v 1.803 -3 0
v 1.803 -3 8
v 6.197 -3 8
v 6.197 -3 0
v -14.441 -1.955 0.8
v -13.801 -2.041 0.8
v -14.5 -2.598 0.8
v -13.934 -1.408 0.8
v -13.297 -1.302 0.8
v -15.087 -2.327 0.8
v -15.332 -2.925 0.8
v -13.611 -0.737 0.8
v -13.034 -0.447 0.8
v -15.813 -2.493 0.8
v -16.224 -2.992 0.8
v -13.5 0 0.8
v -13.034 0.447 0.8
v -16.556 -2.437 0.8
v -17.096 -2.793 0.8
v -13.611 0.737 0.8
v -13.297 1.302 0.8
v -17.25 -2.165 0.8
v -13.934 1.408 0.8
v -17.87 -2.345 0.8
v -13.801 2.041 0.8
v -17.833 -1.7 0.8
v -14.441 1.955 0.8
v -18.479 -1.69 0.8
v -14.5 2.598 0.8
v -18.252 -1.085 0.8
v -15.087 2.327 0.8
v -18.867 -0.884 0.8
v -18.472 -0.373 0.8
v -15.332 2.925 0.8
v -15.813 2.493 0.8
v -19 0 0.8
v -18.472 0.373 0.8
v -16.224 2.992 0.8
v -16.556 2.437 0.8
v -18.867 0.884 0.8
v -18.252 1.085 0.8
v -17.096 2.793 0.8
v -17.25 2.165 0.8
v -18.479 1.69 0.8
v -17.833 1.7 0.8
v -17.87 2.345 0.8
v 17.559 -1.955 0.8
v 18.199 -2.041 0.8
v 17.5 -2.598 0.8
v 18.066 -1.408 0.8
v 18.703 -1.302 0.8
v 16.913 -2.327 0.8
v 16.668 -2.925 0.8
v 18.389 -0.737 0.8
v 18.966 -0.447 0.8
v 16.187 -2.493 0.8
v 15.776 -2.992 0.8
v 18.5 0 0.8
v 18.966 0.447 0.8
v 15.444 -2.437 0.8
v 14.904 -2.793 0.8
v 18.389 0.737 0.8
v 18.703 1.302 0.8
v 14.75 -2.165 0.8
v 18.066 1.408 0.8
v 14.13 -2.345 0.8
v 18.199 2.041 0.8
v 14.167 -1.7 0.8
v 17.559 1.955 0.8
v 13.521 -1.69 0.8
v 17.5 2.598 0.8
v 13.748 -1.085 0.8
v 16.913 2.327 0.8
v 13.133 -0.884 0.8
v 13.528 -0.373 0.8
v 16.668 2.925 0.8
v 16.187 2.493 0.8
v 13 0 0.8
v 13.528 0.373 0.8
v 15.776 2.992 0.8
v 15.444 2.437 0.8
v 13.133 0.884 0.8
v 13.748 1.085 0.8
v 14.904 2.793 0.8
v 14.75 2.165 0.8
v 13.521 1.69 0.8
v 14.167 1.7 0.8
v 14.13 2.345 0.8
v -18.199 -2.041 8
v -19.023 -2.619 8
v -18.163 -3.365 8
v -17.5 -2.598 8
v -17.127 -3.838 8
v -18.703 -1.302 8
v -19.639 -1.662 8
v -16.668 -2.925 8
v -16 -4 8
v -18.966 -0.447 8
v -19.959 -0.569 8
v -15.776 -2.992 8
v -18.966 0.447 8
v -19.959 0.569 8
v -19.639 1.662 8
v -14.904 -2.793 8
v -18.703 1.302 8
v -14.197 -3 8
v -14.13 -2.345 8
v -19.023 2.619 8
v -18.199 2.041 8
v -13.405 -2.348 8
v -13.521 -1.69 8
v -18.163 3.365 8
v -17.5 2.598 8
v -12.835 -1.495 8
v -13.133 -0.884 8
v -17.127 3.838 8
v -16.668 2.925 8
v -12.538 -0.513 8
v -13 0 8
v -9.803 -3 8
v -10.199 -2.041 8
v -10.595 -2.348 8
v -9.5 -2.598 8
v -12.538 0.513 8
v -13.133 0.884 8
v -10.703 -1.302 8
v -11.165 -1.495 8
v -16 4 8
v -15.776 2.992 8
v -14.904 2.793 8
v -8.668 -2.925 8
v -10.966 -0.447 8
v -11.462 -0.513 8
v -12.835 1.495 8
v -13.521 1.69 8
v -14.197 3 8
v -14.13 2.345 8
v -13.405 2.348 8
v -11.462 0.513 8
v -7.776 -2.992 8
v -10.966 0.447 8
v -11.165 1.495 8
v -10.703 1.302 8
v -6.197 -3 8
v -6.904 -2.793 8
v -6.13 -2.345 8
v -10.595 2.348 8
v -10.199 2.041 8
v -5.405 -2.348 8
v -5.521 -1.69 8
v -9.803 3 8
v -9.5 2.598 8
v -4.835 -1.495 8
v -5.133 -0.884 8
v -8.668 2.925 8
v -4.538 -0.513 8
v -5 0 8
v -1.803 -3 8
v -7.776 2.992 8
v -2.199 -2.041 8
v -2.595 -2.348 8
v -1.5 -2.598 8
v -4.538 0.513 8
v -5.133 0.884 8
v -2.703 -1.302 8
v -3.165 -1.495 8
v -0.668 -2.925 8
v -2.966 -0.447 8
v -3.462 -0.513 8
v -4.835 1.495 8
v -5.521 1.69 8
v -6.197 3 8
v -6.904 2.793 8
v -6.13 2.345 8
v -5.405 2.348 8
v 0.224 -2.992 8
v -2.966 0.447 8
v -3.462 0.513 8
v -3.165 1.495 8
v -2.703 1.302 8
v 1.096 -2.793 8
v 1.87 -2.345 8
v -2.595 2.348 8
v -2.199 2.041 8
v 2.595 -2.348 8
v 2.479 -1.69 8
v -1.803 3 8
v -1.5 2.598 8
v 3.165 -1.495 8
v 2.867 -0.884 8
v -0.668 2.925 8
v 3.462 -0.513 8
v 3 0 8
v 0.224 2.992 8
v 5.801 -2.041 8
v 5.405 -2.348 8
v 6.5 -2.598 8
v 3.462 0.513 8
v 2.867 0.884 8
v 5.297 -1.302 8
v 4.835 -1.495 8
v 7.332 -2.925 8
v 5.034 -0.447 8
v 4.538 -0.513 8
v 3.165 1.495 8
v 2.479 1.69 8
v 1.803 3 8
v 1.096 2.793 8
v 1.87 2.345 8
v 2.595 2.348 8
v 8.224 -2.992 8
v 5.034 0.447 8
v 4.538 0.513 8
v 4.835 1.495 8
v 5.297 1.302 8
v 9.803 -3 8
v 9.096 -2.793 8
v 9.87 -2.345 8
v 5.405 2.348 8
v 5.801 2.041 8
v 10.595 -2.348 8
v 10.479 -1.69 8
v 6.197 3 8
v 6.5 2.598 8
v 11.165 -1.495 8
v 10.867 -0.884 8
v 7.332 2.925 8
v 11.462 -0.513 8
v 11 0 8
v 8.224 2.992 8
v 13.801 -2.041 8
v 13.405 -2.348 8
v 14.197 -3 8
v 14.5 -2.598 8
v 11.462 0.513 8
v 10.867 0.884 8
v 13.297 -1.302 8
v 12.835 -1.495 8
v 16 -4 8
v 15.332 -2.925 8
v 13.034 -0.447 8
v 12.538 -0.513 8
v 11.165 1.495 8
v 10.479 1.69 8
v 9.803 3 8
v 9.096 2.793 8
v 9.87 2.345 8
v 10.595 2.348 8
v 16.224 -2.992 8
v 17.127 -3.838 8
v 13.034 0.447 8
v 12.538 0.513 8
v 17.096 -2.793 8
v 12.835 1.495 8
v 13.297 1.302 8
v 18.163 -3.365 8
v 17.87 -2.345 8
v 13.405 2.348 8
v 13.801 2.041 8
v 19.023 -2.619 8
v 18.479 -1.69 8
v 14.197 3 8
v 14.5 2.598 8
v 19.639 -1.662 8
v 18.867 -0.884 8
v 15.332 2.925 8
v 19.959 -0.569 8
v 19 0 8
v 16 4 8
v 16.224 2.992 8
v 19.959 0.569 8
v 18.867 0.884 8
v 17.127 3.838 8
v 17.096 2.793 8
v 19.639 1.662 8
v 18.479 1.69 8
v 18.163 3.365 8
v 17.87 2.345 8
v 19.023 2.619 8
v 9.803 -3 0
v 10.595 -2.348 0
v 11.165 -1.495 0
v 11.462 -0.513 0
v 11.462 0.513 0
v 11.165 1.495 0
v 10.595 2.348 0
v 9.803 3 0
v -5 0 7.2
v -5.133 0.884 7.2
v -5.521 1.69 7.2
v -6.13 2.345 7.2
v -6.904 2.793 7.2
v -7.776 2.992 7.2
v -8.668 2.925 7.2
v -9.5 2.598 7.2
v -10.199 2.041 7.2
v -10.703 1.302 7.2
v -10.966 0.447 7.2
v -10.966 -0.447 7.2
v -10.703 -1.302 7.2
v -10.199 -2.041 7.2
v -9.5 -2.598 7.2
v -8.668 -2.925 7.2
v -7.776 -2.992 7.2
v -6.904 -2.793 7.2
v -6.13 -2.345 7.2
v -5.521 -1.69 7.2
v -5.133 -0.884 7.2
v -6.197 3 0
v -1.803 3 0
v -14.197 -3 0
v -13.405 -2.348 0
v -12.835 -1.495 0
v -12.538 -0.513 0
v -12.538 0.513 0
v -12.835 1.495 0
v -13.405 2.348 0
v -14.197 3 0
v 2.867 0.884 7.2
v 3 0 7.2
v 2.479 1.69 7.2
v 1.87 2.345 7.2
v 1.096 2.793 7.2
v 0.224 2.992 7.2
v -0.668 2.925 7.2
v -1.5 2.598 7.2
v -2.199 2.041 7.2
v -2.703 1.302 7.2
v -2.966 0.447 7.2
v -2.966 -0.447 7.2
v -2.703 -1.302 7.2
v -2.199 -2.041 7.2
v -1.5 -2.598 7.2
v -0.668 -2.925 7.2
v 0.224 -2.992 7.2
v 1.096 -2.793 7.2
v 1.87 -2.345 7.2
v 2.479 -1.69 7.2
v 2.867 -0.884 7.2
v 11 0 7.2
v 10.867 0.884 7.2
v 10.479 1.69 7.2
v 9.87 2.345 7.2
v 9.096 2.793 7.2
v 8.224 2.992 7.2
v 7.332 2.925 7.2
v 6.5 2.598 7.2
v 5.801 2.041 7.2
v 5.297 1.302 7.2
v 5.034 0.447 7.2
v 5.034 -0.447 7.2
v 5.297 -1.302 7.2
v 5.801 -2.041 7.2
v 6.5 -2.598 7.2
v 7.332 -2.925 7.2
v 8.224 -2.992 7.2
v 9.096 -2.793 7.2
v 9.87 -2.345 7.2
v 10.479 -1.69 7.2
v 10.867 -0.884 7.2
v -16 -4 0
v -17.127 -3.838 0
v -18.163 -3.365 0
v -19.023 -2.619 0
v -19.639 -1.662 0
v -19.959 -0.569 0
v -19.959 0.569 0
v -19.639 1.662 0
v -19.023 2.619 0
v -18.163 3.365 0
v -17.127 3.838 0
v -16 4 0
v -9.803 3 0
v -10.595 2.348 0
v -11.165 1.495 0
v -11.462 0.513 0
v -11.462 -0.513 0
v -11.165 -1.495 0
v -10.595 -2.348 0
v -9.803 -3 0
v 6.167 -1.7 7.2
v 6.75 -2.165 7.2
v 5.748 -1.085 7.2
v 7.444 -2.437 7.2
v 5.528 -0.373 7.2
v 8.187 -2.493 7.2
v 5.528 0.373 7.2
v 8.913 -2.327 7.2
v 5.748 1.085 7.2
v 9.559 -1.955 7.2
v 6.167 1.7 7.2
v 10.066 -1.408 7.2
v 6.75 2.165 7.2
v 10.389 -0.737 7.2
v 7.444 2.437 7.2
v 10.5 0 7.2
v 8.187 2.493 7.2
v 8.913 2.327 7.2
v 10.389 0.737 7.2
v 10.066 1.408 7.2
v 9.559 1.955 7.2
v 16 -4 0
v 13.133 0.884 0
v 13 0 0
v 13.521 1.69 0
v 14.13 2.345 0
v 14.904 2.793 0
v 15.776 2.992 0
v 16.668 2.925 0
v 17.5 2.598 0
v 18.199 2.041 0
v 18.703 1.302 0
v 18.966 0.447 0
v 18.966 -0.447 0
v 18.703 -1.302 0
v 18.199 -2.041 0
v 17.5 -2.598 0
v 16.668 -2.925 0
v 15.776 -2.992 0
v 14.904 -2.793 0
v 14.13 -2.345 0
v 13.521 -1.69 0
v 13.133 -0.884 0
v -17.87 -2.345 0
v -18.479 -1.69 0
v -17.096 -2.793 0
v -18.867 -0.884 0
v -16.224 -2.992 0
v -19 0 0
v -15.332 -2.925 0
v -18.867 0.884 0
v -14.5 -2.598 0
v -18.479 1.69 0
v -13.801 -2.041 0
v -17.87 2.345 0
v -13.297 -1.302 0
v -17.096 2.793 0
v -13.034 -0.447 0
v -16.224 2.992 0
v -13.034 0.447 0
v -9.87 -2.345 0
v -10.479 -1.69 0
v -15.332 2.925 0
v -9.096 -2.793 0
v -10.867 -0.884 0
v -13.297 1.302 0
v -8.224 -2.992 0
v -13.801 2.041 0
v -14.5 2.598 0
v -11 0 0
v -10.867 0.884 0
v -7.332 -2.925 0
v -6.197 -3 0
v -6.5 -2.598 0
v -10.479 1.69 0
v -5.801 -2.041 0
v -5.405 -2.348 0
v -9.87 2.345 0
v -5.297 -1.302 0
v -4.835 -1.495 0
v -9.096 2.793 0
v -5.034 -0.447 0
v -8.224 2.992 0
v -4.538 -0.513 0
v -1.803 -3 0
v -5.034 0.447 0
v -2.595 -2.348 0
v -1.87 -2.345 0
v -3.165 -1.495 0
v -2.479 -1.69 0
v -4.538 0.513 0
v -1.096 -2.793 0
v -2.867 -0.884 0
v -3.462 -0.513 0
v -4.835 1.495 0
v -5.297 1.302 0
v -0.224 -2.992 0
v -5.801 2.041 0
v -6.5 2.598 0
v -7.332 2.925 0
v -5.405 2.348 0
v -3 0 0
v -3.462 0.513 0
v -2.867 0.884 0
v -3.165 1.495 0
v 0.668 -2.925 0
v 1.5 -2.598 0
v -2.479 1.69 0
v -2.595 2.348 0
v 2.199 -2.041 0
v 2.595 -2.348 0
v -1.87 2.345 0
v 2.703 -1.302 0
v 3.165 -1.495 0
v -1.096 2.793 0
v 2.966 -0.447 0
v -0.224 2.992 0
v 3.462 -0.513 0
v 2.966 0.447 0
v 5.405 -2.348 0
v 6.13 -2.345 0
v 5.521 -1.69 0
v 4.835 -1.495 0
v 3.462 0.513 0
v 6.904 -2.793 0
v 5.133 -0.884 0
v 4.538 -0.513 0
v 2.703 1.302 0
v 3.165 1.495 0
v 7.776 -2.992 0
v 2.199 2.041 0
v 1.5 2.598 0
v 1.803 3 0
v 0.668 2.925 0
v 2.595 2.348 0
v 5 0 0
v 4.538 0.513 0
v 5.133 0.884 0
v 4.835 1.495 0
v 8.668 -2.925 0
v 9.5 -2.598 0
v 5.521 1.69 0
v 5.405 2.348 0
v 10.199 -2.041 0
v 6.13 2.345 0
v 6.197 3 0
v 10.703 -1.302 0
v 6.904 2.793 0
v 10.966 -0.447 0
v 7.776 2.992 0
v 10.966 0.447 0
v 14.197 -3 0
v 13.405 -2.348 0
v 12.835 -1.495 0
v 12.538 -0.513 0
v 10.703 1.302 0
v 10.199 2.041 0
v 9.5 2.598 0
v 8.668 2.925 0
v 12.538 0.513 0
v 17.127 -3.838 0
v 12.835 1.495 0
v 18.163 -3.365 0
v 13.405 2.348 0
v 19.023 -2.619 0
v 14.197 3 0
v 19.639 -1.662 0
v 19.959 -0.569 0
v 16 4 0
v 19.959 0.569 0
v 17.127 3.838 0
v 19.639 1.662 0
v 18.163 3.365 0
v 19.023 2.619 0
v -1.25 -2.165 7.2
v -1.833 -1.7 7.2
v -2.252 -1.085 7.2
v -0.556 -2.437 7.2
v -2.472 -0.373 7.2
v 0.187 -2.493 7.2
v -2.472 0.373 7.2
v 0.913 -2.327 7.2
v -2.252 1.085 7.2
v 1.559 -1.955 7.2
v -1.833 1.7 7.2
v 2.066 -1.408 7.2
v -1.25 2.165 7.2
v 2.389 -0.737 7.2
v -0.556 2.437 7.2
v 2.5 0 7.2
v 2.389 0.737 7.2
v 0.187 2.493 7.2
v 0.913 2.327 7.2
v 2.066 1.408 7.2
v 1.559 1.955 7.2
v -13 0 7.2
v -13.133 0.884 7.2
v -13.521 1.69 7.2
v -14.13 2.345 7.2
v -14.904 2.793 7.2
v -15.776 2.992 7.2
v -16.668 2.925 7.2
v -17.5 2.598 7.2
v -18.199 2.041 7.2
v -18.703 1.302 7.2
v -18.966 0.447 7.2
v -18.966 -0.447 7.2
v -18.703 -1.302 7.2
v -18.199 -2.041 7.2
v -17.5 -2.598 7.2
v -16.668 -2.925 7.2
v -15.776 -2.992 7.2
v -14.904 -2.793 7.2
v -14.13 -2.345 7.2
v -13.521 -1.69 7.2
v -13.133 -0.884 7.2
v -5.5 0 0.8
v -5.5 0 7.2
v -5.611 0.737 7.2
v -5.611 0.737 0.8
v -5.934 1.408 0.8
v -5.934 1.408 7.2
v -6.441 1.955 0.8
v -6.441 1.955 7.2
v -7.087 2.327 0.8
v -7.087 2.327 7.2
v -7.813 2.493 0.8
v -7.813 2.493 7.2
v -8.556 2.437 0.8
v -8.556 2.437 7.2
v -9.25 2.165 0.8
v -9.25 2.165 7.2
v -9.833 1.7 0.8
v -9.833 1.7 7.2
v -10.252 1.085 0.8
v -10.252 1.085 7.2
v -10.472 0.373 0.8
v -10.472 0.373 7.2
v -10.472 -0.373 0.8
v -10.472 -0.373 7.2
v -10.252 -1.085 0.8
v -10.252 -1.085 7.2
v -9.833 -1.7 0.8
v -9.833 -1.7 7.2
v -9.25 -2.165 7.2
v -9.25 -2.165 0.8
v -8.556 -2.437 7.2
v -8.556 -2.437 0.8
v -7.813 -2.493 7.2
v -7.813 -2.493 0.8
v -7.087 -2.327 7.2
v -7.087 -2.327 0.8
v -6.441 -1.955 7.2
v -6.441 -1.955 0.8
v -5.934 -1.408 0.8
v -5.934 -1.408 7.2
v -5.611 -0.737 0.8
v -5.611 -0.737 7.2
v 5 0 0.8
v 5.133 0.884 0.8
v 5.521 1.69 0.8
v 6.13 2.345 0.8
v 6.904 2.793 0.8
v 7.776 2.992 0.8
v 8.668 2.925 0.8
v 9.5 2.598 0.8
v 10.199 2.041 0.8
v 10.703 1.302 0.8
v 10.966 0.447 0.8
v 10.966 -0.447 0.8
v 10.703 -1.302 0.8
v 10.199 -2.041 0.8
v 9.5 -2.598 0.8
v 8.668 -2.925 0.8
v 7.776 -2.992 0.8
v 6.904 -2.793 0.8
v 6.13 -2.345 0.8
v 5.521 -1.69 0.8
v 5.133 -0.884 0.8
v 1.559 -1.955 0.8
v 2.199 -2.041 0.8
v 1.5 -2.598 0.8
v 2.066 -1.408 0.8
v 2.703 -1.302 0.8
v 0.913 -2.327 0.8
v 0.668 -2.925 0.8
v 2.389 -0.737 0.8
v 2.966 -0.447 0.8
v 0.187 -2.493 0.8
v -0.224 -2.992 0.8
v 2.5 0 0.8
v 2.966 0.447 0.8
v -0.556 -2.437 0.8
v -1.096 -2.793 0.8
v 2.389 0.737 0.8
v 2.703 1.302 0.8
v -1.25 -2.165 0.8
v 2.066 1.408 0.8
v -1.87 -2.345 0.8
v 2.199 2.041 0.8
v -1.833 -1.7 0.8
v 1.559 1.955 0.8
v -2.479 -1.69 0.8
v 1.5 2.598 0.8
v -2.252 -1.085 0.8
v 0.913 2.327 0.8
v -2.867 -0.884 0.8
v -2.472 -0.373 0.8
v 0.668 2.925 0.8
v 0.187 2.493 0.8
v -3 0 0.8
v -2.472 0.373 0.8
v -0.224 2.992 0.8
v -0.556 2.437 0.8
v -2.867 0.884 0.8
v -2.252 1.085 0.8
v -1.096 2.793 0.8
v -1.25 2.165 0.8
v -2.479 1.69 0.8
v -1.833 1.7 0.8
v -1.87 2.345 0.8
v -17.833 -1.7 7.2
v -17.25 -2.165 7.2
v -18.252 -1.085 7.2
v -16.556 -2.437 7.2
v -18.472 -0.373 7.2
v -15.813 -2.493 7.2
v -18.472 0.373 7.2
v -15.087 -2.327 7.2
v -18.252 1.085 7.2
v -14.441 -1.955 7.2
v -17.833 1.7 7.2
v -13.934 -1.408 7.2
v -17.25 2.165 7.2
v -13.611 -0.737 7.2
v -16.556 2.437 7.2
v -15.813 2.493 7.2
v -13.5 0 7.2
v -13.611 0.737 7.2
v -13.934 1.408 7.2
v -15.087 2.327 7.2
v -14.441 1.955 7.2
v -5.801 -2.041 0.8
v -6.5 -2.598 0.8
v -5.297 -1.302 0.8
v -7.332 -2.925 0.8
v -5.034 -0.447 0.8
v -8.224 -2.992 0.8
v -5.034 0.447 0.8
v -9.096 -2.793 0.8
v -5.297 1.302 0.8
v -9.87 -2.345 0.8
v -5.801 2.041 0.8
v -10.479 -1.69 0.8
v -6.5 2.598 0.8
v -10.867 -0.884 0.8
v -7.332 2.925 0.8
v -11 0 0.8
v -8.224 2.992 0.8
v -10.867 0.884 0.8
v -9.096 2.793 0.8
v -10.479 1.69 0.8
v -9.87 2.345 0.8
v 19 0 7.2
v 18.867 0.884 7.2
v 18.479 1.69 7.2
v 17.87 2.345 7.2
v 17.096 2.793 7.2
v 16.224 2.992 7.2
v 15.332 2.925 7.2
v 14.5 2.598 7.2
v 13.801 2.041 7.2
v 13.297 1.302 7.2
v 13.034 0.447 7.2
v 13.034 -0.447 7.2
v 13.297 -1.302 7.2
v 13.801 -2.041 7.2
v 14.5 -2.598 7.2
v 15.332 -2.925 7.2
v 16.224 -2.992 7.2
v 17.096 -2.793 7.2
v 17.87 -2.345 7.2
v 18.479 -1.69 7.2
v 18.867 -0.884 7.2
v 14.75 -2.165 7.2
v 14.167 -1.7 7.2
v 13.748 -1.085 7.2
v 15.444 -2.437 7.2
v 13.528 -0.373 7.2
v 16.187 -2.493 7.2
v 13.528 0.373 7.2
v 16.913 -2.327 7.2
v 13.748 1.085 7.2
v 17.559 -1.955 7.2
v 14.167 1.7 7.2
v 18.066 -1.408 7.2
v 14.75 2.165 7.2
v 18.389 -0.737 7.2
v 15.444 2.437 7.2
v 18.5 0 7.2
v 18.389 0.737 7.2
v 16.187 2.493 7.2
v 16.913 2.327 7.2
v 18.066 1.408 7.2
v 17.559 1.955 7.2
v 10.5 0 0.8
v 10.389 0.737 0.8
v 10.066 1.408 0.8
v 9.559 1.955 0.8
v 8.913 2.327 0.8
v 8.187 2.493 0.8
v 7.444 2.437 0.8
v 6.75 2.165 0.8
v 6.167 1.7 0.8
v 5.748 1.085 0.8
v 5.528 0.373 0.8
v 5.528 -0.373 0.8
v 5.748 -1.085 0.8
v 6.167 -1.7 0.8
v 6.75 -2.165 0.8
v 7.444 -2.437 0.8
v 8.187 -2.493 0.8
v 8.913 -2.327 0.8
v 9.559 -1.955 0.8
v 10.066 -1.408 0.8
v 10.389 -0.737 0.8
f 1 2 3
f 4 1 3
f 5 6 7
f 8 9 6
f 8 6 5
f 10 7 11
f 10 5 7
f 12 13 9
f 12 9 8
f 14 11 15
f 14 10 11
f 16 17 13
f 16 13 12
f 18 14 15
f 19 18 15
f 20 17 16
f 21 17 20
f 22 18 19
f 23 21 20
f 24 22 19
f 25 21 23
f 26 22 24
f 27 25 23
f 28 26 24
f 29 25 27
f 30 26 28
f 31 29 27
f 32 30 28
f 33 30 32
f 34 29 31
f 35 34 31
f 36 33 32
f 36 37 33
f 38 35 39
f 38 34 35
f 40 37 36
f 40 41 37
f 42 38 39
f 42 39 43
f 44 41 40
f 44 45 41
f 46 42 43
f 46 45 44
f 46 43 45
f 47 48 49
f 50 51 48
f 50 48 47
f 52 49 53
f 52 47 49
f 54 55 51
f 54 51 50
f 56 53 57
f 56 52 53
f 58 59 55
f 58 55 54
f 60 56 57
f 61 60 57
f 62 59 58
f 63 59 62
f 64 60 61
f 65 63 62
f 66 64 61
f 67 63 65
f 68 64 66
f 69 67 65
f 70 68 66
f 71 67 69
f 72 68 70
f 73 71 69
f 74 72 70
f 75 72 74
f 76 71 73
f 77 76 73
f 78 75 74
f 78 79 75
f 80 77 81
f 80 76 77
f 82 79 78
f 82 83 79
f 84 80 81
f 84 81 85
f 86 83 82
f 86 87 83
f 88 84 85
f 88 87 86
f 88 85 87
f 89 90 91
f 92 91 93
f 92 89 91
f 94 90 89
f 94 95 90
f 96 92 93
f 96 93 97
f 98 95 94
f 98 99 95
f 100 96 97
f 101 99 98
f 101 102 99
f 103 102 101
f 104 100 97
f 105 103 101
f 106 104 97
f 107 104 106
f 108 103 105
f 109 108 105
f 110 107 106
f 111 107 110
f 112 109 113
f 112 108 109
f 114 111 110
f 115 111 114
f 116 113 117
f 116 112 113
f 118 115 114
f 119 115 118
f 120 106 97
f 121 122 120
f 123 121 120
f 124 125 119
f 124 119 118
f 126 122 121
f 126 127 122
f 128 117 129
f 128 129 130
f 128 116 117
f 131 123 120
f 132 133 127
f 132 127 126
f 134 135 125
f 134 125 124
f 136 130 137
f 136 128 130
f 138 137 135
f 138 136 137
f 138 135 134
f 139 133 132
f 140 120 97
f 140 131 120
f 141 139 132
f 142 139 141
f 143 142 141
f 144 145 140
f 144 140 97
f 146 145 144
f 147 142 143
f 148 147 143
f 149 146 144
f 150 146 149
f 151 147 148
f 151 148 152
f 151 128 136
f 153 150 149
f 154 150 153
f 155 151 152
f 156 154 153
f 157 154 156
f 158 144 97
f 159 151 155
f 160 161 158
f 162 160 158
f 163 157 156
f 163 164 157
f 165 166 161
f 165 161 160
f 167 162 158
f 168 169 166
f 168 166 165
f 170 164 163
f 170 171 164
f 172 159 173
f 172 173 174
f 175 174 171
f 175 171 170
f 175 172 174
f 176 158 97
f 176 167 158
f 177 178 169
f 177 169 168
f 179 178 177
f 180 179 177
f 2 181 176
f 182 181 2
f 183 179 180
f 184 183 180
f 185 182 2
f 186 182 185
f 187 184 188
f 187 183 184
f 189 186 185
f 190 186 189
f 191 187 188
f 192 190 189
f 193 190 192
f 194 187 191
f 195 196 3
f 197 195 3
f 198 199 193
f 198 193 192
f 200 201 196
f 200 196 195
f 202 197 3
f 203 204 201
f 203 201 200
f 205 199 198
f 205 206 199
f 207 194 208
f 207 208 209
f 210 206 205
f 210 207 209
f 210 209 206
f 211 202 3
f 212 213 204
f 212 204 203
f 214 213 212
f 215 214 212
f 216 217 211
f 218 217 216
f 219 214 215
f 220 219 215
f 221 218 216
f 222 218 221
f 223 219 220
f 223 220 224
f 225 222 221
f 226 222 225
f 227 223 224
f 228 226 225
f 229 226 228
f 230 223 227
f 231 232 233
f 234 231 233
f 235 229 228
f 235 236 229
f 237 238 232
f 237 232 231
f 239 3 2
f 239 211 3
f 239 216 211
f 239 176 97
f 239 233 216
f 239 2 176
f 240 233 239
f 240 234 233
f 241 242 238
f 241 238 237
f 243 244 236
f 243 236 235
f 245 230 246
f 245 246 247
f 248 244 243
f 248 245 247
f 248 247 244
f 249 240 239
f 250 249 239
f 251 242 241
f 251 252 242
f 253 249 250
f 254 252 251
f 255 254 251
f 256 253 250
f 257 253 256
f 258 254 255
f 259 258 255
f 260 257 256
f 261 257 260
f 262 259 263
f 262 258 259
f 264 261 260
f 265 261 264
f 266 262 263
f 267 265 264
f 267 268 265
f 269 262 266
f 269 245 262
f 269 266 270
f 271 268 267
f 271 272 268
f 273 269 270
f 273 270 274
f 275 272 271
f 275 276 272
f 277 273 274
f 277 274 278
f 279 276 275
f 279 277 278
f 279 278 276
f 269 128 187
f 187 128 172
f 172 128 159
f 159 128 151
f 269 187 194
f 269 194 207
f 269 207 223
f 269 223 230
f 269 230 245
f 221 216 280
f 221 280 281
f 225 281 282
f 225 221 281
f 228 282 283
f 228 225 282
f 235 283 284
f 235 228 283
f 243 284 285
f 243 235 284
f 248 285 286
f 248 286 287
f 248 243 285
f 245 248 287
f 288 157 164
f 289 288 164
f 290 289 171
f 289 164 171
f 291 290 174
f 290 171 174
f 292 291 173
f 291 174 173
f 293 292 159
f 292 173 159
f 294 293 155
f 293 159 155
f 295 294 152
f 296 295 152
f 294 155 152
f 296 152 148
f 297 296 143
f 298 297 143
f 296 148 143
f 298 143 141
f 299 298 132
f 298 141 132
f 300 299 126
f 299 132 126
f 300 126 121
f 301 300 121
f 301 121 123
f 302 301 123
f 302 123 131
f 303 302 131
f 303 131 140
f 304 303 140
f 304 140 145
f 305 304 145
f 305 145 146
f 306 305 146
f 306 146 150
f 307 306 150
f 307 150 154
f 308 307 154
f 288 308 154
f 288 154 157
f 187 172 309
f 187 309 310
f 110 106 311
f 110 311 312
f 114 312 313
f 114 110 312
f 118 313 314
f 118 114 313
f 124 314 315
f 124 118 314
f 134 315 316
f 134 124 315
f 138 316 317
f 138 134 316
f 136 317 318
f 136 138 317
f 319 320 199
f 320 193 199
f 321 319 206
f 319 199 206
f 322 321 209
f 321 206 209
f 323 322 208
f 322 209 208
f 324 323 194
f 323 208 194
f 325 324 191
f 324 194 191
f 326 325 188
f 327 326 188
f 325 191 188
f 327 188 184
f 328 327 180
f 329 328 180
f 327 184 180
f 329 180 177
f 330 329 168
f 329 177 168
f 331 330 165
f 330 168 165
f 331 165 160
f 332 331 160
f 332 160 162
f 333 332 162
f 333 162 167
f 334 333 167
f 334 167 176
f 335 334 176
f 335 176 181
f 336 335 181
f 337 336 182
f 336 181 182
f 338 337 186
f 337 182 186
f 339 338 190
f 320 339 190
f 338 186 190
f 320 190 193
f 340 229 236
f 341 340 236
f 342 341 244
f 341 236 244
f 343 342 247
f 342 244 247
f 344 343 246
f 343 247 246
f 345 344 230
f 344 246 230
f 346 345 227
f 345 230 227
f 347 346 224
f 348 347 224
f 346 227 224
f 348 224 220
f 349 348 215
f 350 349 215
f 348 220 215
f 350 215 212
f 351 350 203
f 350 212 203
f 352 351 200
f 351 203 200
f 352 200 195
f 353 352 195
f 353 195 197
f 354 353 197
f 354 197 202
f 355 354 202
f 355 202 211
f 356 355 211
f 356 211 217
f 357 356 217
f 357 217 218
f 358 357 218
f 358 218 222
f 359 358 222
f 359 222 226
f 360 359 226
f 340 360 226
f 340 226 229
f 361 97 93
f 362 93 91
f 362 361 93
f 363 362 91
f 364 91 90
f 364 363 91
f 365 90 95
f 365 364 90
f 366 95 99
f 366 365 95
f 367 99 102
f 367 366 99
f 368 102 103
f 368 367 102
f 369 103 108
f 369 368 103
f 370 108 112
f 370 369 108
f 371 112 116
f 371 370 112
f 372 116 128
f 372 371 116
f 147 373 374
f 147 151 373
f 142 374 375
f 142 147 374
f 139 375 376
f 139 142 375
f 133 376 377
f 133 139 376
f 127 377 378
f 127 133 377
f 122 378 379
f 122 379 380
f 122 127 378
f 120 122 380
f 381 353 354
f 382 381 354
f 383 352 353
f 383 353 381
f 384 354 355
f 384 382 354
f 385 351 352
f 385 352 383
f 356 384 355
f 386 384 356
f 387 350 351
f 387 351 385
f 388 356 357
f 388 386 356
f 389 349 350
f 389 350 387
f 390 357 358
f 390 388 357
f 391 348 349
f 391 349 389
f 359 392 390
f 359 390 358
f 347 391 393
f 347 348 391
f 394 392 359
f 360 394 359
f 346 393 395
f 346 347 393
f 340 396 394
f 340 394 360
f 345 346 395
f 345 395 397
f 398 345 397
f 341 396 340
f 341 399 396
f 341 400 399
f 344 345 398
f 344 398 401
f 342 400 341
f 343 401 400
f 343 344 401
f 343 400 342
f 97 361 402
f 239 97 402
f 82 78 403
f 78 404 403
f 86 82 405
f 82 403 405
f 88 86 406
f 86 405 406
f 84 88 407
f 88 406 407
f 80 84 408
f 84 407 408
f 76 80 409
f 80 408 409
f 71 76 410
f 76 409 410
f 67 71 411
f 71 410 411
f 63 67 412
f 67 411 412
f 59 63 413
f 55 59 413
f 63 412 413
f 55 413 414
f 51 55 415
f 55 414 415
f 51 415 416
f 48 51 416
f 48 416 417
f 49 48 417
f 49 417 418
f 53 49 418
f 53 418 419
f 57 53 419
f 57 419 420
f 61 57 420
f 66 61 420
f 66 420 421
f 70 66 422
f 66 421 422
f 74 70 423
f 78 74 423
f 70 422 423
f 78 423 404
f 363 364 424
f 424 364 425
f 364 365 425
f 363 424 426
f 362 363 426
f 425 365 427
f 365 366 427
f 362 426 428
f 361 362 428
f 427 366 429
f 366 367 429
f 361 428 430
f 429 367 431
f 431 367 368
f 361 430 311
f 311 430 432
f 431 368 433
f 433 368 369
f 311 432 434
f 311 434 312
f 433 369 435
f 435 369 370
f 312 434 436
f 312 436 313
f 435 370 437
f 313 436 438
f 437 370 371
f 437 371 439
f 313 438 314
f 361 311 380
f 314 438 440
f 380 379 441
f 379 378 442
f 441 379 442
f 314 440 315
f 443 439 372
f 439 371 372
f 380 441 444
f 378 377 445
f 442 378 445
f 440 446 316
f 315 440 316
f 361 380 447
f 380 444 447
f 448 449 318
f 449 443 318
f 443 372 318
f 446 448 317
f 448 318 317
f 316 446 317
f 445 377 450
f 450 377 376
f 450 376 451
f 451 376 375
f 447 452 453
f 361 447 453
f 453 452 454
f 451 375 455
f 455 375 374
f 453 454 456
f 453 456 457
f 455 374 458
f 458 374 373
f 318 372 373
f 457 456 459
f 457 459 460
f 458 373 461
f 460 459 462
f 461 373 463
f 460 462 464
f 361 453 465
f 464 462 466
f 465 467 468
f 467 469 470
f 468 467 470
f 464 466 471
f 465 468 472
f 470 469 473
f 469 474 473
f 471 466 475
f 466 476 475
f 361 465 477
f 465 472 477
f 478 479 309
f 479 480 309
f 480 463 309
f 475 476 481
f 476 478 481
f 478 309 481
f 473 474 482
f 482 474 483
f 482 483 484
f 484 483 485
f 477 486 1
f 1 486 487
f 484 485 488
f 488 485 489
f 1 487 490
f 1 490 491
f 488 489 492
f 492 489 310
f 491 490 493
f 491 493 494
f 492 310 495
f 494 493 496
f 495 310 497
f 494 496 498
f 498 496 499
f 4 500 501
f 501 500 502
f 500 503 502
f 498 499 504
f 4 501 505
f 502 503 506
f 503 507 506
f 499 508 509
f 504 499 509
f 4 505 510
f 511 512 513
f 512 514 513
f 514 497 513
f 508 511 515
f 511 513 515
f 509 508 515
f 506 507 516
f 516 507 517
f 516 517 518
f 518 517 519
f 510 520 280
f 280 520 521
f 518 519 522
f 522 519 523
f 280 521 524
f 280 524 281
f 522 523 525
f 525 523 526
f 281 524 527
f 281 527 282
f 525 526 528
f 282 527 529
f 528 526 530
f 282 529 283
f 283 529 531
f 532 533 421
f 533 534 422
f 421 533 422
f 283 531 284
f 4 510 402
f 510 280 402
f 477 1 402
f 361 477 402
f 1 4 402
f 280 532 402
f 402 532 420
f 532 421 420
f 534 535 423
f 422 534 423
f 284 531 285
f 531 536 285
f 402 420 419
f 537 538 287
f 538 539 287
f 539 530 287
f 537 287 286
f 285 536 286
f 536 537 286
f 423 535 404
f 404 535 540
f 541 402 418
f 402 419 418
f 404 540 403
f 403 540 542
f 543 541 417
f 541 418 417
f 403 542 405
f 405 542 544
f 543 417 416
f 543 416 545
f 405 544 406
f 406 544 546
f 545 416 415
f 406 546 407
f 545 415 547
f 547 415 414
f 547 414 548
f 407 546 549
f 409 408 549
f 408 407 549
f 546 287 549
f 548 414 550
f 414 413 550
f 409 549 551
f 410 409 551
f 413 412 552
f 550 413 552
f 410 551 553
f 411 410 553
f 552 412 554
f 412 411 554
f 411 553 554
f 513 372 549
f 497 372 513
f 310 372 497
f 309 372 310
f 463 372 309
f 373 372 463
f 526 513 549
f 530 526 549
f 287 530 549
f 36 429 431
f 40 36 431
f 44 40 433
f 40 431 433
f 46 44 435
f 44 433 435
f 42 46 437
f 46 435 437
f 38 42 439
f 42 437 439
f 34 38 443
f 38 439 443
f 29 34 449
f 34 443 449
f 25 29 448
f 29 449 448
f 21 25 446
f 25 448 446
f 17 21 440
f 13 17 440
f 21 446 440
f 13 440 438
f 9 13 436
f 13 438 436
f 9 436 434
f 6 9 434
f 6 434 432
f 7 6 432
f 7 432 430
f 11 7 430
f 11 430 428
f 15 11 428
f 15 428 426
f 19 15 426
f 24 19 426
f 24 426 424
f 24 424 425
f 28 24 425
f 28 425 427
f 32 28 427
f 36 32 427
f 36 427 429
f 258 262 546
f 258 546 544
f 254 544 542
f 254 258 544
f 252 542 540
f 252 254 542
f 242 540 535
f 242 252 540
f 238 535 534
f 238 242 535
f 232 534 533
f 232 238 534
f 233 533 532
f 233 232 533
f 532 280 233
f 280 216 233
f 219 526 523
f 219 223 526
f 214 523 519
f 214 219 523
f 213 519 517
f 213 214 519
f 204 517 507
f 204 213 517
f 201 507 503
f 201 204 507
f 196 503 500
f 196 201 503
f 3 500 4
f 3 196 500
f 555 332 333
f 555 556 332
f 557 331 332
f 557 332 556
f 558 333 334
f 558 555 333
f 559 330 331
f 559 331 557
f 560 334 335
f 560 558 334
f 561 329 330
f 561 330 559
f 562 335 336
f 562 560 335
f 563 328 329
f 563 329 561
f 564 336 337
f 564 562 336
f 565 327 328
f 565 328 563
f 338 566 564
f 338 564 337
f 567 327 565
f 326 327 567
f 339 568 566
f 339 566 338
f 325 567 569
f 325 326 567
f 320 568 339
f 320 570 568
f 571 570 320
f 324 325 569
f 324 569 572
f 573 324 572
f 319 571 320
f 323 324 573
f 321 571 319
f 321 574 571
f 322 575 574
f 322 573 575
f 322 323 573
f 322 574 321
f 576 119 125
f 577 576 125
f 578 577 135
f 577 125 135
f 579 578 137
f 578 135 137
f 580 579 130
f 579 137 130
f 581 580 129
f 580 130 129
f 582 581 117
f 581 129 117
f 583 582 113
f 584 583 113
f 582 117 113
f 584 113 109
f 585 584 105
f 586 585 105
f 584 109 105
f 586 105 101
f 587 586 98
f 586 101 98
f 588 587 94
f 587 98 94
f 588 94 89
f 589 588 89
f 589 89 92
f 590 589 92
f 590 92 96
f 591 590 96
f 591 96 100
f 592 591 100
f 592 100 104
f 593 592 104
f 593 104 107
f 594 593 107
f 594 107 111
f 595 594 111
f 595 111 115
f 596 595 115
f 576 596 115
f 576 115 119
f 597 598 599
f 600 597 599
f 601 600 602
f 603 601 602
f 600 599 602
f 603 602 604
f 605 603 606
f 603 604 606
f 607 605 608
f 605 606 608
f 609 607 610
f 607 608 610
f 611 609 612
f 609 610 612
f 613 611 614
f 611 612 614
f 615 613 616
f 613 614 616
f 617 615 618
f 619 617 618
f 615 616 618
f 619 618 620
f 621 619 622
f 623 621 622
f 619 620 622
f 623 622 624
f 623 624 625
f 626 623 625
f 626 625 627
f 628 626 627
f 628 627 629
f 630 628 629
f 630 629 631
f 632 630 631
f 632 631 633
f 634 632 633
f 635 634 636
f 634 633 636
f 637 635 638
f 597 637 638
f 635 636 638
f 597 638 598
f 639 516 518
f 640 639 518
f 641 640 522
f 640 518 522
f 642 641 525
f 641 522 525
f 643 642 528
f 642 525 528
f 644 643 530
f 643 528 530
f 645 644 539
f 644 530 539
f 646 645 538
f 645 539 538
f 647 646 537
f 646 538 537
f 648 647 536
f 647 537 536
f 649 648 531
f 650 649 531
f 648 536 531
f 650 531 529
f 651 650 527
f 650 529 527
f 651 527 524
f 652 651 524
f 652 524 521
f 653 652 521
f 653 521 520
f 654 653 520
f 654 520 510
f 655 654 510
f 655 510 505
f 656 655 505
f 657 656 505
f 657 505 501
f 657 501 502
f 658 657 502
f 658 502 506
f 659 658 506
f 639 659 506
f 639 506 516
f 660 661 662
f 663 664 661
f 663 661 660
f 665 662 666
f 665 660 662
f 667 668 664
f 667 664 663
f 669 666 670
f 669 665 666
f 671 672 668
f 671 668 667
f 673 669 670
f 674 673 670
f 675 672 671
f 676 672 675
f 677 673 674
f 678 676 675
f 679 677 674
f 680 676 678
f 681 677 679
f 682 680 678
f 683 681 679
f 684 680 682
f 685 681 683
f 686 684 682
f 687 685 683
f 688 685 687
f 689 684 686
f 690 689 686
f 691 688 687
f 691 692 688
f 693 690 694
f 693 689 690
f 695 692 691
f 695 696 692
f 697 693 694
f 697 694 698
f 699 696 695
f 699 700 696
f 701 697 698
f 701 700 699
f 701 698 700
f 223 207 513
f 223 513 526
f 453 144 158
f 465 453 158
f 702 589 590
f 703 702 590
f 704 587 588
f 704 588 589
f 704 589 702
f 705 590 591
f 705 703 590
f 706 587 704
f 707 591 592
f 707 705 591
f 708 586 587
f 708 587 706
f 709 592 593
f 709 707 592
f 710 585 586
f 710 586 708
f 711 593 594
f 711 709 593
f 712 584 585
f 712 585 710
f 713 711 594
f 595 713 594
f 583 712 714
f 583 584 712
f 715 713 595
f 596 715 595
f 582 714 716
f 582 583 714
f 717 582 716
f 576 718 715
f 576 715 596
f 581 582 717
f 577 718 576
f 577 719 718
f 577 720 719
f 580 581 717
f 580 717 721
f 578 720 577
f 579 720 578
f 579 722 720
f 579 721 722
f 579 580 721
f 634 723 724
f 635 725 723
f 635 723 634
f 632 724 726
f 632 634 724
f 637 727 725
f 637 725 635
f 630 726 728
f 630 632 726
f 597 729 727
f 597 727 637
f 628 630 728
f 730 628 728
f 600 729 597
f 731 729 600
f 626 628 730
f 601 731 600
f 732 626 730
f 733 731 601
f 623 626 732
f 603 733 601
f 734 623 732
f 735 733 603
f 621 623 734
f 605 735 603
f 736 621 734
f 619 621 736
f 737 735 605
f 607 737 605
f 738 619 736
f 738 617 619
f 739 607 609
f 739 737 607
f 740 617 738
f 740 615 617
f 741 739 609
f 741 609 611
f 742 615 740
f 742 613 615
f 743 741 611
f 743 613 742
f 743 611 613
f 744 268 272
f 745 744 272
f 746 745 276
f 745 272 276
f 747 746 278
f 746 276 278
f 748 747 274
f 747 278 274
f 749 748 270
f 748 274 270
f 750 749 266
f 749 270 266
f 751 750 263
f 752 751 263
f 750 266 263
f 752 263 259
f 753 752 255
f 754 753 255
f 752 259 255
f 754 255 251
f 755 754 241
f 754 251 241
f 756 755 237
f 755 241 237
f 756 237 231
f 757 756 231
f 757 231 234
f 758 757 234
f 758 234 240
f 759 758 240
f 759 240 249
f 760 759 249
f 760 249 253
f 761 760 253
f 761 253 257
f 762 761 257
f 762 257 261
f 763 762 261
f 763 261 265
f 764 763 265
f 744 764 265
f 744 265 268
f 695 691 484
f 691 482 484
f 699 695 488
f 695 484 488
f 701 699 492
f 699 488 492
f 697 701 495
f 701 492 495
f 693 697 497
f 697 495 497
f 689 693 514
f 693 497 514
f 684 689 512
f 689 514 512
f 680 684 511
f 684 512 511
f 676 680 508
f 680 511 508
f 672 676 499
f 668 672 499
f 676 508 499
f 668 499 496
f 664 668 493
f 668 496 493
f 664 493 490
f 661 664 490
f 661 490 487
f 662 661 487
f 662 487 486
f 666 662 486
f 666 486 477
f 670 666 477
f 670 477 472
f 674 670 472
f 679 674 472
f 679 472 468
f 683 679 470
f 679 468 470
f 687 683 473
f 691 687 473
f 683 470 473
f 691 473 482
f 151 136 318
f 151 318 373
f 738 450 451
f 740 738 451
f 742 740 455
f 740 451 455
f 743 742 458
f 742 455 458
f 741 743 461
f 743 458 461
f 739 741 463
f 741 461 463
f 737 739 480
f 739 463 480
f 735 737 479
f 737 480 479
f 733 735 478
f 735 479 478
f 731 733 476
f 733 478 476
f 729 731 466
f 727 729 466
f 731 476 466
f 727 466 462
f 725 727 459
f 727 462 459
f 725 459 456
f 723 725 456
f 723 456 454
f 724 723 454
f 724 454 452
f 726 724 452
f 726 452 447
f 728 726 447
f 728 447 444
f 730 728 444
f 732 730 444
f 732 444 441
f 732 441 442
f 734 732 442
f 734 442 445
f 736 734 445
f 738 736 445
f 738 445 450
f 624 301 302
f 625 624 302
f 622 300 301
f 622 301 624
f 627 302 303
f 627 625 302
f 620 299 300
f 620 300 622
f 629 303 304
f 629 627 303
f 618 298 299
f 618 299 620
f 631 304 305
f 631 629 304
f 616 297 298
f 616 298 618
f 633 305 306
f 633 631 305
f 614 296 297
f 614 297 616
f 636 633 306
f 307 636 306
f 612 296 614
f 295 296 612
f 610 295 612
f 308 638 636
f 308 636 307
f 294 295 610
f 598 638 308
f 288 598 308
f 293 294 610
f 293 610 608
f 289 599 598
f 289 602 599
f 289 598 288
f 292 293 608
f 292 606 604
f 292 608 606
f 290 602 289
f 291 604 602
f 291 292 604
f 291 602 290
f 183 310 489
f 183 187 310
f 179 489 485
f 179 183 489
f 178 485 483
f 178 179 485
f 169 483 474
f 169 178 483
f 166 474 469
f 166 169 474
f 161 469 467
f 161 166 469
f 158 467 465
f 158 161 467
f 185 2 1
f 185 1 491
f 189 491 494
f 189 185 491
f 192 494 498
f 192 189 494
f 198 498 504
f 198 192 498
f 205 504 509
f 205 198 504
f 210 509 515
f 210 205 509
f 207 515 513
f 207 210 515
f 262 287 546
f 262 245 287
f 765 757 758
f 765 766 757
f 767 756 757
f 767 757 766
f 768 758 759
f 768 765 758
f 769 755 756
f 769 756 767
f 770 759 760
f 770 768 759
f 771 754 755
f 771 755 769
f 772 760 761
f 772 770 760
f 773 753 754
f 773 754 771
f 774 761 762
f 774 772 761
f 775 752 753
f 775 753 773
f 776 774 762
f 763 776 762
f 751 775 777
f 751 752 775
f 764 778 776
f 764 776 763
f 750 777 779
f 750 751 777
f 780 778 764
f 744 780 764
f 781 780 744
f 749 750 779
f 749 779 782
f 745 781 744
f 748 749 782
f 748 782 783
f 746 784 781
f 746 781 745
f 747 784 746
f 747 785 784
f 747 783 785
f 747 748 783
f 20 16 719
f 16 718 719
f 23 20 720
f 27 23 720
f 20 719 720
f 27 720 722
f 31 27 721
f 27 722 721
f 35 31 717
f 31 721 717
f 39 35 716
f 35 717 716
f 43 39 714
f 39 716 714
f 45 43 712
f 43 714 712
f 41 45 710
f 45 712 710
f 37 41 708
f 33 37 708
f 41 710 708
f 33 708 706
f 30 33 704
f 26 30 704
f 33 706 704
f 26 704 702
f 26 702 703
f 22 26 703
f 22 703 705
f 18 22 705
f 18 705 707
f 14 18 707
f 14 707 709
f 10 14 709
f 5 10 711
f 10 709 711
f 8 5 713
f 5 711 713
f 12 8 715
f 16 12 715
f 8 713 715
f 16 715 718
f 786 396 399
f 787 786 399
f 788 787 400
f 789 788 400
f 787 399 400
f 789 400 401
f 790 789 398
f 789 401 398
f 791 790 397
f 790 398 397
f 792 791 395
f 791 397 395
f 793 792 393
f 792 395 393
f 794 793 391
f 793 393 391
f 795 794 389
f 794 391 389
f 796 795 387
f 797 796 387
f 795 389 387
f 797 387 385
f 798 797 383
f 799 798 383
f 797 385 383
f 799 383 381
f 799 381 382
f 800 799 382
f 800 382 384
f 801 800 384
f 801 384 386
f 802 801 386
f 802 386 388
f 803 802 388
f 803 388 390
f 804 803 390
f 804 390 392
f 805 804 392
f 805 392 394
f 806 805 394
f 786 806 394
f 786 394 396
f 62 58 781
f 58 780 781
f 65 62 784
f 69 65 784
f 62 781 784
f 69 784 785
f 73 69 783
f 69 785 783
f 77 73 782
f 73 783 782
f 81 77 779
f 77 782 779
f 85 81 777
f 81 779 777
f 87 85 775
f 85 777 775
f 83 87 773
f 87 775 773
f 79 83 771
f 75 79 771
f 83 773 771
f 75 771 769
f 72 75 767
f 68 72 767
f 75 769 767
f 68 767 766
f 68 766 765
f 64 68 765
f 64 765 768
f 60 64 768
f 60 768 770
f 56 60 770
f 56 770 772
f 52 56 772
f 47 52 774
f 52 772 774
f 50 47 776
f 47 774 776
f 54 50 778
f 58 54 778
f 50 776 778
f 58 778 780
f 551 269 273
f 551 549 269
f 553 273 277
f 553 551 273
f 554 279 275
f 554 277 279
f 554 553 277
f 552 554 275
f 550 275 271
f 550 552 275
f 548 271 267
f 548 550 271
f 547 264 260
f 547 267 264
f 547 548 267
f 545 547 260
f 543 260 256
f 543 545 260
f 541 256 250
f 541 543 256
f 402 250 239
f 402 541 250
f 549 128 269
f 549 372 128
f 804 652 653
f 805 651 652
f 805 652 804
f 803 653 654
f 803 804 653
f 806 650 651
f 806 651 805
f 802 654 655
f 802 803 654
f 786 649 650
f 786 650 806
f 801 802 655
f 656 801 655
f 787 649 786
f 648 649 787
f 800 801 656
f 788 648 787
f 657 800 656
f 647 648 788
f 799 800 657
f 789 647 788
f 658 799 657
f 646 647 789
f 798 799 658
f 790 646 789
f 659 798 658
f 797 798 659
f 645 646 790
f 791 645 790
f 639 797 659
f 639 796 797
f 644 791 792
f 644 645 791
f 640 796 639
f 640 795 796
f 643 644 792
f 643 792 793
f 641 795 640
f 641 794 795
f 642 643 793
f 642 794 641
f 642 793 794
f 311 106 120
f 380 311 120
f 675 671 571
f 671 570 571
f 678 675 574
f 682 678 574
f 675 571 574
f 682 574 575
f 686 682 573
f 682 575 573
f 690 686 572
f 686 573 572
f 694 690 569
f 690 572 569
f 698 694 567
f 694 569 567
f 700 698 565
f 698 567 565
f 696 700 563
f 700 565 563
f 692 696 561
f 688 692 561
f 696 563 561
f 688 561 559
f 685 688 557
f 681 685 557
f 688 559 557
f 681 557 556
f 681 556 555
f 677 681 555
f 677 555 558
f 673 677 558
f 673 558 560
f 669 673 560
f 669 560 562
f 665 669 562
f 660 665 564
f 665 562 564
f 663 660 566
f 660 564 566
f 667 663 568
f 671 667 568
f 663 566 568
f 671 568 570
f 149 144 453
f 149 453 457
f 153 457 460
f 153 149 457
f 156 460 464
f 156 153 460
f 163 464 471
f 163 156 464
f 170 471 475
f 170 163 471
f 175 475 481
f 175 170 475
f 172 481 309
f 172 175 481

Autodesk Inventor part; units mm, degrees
ref_plane "YZ Plane" through (0, 0, 0) normal (1, 0, 0) x (0, 1, 0)
ref_plane "XZ Plane" through (0, 0, 0) normal (0, 1, 0) x (-1, 0, 0)
ref_plane "XY Plane" through (0, 0, 0) normal (0, 0, 1) x (1, 0, 0)
sketch "Sketch1" plane through (0, 0, 0) normal (0, 0, 1) x (1, 0, 0)
  arc A0 (-16, 4) -> (-16, -4) centre (-16, 0) ccw
  arc A1 (16, -4) -> (16, 4) centre (16, 0) ccw
  line L0 (-16, -4) -> (16, -4)
  line L1 (-16, 4) -> (16, 4)
  line L2 (-28, 0) -> (28, 0) projected
  line L3 (0, -5.6) -> (0, 5.6) projected
  point P0 (0, 0)
  dimension "d3" = 4
  dimension "d4" = 4
  dimension "d5" = 32
  dimension "d6" = 32
  dimension "d7" = 0
  dimension "d8" = 16
  dimension "d9" = 32
  dimension "d10" = 32
extrude "Extrusion1" add sketch "Sketch1" along normal blind 8
sketch "Sketch2" plane through (0, 0, 8) normal (0, 0, 1) x (1, 0, 0)
  arc A0 (-16, 4) -> (-16, -4) centre (-16, 0) ccw projected
  circle A1 centre (-16, 0) radius 2.5
  line L0 (-28, 0) -> (28, 0) projected
  circle A2 centre (-8, 0) radius 2.5
  circle A3 centre (0, 0) radius 2.5
  circle A4 centre (8, 0) radius 2.5
  circle A5 centre (16, 0) radius 2.5
  dimension "d13" = 5
  dimension "d19" = 8
extrude "Extrusion2" cut sketch "Sketch2" against normal through all
sketch "Sketch3" plane through (0, 0, 8) normal (0, 0, 1) x (1, 0, 0)
  circle A0 centre (16, 0) radius 2.5 projected
  circle A1 centre (8, 0) radius 2.5 projected
  circle A2 centre (0, 0) radius 2.5 projected
  circle A3 centre (-8, 0) radius 2.5 projected
  circle A4 centre (-16, 0) radius 2.5 projected
  arc A5 (-16, 4) -> (-16, -4) centre (-16, 0) ccw projected
  circle A6 centre (-16, 0) radius 3
  line L0 (-28, 0) -> (28, 0) projected
  circle A7 centre (-8, 0) radius 3
  circle A8 centre (0, 0) radius 3
  circle A9 centre (8, 0) radius 3
  circle A10 centre (16, 0) radius 3
  dimension "d23" = 6
  dimension "d29" = 8
extrude "Extrusion3" cut sketch "Sketch3" against normal blind 0.8 contours L0 A10 A0 | A0 L0 A10 | A6 L0 A4 | L0 A4 A6 | A7 L0 A3 | L0 A3 A7 | A8 L0 A2 | L0 A2 A8 | A9 L0 A1 | L0 A1 A9
sketch "Sketch4" plane through (0, 0, 0) normal (0, 0, -1) x (-1, 0, 0)
  circle A0 centre (-16, 0) radius 2.5 projected
  circle A1 centre (-8, 0) radius 2.5 projected
  circle A2 centre (0, 0) radius 2.5 projected
  circle A3 centre (8, 0) radius 2.5 projected
  circle A4 centre (16, 0) radius 2.5 projected
  arc A5 (-16, 4) -> (-16, -4) centre (-16, 0) ccw projected
  circle A6 centre (-16, 0) radius 3
  line L0 (28, 0) -> (-28, 0) projected
  circle A7 centre (-8, 0) radius 3
  circle A8 centre (0, 0) radius 3
  circle A9 centre (8, 0) radius 3
  circle A10 centre (16, 0) radius 3
  dimension "d33" = 6
  dimension "d39" = 8
extrude "Extrusion4" cut sketch "Sketch4" against normal blind 0.8 contours L0 A6 A0 | A0 L0 A6 | A10 L0 A4 | L0 A4 A10 | A9 L0 A3 | L0 A3 A9 | A8 L0 A2 | L0 A2 A8 | A7 L0 A1 | L0 A1 A7
sketch "Sketch5" plane through (0, 0, 8) normal (0, 0, 1) x (1, 0, 0)
  circle A0 centre (-8, 0) radius 3 projected
  arc A1 (-16, 4) -> (-16, -4) centre (-16, 0) ccw projected
  arc A2 (-14.1972, -3) -> (-14.1972, 3) centre (-16, 0) ccw
  arc A3 (-9.8028, 3) -> (-9.8028, -3) centre (-8, 0) ccw
  line L0 (-14.1972, 3) -> (-9.8028, 3)
  line L1 (-14.1972, -3) -> (-9.8028, -3)
  line L2 (-28, 0) -> (28, 0) projected
  arc A4 (-6.1972, -3) -> (-6.1972, 3) centre (-8, 0) ccw
  arc A5 (-1.8028, 3) -> (-1.8028, -3) centre (0, 0) ccw
  line L3 (-6.1972, 3) -> (-1.8028, 3)
  line L4 (-6.1972, -3) -> (-1.8028, -3)
  arc A6 (1.8028, -3) -> (1.8028, 3) centre (0, 0) ccw
  arc A7 (6.1972, 3) -> (6.1972, -3) centre (8, 0) ccw
  line L5 (1.8028, 3) -> (6.1972, 3)
  line L6 (1.8028, -3) -> (6.1972, -3)
  arc A8 (9.8028, -3) -> (9.8028, 3) centre (8, 0) ccw
  arc A9 (14.1972, 3) -> (14.1972, -3) centre (16, 0) ccw
  line L7 (9.8028, 3) -> (14.1972, 3)
  line L8 (9.8028, -3) -> (14.1972, -3)
  dimension "d43" = 3.5
  dimension "d44" = 3.5
  dimension "d45" = 4.3944
  dimension "d46" = 4.3944
  dimension "d52" = 8
extrude "Extrusion5" cut sketch "Sketch5" against normal through all contours A3 L1 A2 L2 | L2 A2 L0 A3 | A8 L7 A9 L2 | L2 A9 L8 A8 | A6 L5 A7 L2 | L2 A7 L6 A6 | A4 L3 A5 L2 | L2 A5 L4 A4
properties part number "5M Beam"
